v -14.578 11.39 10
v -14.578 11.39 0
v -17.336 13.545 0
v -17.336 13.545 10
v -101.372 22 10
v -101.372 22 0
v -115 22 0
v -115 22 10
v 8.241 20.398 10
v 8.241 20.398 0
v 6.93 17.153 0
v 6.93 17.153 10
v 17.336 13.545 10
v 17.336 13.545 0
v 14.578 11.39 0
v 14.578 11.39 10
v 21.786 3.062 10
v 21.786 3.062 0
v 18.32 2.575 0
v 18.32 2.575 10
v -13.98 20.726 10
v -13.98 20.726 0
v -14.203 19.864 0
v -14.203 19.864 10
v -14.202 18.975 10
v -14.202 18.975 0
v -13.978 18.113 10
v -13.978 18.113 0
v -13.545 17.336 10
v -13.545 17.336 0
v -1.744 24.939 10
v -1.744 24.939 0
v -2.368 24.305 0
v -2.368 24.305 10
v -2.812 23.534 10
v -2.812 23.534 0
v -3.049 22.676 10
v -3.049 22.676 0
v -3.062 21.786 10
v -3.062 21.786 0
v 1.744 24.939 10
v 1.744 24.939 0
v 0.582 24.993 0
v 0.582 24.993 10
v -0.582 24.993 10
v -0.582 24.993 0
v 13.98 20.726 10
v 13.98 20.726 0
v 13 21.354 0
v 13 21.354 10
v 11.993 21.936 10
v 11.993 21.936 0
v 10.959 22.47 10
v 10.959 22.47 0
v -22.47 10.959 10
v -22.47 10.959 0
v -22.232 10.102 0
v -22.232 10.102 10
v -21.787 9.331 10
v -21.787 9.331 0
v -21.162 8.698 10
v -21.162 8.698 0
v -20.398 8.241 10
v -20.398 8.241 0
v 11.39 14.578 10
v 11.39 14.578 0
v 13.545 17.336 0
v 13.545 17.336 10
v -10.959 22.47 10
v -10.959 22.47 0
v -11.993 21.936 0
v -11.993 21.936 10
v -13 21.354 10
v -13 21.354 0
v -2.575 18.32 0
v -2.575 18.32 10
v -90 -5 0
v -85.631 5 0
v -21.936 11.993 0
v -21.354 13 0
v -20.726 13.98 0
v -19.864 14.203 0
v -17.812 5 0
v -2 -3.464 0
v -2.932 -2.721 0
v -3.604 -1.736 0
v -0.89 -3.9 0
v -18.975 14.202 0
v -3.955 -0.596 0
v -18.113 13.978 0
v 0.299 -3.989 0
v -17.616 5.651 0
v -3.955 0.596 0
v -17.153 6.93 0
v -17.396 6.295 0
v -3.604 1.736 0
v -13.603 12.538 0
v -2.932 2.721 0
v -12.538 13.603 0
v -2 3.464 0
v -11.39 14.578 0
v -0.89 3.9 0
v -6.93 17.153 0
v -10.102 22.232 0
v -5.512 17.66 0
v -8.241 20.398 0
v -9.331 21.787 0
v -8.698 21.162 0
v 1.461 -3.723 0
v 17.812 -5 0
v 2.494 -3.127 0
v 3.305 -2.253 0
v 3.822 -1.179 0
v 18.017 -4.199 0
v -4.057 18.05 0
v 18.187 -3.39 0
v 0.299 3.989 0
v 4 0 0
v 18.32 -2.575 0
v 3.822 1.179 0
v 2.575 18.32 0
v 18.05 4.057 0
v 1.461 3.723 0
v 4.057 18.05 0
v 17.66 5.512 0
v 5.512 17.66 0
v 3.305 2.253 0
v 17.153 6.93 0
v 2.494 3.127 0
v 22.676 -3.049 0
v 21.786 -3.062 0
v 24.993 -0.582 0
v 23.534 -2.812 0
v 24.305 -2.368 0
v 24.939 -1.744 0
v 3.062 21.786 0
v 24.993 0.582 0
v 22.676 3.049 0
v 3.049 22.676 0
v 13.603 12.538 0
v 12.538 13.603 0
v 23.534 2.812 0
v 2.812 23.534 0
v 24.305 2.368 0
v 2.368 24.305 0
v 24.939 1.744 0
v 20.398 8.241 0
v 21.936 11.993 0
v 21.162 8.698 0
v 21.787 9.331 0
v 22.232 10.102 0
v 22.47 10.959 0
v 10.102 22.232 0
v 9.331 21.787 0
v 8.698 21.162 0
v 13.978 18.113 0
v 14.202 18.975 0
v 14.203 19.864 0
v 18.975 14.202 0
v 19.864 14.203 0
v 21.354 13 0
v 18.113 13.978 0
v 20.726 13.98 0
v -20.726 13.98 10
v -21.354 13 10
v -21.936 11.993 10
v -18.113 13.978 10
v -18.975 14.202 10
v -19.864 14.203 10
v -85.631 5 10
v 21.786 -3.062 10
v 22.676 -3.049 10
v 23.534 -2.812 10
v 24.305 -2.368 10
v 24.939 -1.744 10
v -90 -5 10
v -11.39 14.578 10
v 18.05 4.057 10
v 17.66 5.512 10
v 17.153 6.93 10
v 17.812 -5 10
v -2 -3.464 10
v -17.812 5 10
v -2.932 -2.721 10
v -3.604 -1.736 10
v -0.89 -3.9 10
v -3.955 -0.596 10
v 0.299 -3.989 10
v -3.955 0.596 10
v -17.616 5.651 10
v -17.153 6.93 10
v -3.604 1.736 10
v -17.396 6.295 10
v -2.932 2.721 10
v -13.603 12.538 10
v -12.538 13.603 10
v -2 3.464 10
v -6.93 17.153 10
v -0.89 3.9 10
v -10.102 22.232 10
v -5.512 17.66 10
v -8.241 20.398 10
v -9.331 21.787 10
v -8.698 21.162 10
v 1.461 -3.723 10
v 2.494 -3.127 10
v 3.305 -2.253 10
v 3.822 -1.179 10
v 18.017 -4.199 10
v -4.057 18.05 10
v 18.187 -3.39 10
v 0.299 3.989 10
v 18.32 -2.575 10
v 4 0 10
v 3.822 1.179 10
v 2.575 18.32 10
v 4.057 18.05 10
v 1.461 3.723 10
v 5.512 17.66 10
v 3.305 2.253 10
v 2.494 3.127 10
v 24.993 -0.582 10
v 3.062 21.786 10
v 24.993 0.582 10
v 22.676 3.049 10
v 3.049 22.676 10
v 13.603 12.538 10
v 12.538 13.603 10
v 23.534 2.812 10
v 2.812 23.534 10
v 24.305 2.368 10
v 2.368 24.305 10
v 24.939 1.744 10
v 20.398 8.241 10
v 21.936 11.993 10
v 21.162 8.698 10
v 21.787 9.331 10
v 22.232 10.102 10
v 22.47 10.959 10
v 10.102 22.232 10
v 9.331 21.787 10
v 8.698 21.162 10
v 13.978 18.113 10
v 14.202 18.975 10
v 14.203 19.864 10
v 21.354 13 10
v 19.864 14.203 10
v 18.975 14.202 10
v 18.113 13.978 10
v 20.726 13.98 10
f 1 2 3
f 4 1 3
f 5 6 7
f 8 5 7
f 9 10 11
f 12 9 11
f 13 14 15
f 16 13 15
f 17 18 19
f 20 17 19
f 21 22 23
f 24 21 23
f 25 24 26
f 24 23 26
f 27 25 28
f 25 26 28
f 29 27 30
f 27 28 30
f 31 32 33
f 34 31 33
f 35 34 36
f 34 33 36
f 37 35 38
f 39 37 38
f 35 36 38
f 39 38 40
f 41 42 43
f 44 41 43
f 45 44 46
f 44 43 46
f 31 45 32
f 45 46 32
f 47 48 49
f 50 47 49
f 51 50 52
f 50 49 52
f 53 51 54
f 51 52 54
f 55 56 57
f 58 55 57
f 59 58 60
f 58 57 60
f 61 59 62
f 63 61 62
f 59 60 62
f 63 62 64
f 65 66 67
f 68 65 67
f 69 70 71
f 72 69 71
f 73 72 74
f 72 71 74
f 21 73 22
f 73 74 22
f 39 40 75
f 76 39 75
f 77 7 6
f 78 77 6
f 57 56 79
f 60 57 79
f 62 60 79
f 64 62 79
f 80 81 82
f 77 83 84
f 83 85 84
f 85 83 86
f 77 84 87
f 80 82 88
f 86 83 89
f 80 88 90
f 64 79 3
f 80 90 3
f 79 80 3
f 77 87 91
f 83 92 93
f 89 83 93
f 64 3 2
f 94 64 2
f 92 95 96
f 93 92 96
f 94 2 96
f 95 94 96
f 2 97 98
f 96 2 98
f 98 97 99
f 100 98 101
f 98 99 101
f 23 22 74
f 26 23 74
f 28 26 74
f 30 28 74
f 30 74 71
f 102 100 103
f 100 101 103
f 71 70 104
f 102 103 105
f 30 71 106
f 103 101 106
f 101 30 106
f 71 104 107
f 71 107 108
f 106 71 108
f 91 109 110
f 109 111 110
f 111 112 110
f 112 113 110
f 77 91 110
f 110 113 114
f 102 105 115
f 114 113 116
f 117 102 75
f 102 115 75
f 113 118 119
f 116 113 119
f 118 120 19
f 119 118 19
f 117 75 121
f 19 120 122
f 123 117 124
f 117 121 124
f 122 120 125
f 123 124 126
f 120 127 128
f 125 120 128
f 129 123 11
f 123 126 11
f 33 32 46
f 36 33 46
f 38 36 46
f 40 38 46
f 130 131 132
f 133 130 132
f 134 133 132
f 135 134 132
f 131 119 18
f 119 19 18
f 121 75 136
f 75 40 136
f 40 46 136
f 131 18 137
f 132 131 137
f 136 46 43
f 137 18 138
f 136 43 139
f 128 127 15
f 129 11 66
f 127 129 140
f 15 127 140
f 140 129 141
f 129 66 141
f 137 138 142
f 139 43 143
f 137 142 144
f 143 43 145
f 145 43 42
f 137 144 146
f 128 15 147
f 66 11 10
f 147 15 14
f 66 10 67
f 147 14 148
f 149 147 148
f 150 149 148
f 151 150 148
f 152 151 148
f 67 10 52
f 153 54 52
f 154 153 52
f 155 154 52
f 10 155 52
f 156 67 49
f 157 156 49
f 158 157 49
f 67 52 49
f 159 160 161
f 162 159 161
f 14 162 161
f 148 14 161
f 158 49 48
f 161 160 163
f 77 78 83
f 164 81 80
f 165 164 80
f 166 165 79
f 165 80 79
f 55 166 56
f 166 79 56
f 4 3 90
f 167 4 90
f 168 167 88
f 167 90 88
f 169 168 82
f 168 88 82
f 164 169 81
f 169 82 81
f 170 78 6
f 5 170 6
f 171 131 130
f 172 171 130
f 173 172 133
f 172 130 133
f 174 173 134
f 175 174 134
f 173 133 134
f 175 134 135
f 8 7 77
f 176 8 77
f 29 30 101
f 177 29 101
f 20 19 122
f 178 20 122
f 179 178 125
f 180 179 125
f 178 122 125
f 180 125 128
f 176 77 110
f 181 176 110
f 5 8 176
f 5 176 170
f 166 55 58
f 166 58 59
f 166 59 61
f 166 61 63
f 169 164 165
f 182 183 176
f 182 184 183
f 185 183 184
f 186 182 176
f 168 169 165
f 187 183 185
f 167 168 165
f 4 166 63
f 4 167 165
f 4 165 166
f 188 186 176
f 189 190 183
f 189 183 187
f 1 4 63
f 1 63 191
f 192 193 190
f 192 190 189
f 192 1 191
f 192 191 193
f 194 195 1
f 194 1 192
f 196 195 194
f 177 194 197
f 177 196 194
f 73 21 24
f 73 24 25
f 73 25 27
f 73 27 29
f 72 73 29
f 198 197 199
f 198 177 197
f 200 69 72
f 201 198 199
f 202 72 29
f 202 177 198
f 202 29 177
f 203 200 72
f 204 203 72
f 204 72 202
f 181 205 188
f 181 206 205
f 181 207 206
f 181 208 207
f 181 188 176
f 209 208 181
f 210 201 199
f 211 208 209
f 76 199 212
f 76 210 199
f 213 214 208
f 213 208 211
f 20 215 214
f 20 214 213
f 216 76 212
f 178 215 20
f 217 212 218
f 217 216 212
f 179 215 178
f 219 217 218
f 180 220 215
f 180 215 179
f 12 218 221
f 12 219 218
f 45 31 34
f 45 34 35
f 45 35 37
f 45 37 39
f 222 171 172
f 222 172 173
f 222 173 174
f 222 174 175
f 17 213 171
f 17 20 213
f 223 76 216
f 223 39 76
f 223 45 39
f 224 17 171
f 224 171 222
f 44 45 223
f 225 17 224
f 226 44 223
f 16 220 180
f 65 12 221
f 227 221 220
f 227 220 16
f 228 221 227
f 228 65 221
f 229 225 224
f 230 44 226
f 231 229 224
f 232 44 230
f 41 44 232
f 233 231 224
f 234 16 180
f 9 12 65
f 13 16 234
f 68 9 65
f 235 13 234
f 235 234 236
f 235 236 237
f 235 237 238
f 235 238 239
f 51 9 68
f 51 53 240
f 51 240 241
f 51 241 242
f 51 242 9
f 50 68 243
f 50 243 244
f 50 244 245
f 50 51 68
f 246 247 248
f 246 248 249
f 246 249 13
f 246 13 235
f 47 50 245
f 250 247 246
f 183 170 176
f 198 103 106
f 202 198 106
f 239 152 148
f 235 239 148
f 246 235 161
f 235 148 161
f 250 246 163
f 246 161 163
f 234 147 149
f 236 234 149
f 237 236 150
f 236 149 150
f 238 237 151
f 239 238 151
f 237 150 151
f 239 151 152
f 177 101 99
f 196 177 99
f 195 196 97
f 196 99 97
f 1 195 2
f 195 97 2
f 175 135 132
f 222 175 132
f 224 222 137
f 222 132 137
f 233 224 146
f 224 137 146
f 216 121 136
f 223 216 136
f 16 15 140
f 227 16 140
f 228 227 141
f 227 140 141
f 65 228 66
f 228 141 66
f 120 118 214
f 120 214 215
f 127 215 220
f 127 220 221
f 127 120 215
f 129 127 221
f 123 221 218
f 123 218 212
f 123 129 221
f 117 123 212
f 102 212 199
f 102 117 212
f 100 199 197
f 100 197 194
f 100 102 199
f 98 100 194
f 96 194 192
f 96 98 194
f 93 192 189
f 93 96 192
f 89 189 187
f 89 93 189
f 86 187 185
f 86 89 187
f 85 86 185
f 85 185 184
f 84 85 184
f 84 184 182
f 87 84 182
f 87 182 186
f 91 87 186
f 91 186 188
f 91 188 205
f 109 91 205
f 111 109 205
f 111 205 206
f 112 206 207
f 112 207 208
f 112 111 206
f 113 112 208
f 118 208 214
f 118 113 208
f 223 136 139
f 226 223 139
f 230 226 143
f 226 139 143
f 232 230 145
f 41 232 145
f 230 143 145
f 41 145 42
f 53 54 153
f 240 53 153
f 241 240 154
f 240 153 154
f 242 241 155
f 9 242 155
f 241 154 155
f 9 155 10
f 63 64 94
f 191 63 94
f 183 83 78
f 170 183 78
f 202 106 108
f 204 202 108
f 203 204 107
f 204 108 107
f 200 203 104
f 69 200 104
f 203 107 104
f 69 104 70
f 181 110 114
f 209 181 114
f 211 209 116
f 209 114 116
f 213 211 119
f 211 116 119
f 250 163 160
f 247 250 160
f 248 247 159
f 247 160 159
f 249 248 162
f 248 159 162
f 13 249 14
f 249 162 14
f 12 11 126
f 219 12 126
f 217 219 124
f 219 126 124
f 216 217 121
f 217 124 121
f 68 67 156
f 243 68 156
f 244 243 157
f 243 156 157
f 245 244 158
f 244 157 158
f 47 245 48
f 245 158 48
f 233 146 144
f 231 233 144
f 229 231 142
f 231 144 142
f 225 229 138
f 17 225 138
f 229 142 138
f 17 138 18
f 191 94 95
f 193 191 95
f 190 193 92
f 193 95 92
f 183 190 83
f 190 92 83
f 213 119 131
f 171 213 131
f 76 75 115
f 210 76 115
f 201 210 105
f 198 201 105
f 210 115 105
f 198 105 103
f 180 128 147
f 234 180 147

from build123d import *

# Parameters (mm, degrees)
SKETCH1_R           = 4
BOSS_EXTRUDE2_DEPTH = 10


with BuildPart() as part:
    # Sketch1 → Boss-Extrude2 (new body)
    with BuildSketch(Plane.XY):
        with BuildLine():
            Line((-101.371578153, 22), (-115, 22))
            Line((-115, 22), (-90, -5))
            Line((-90, -5), (17.811513131, -5))
            ThreePointArc((17.811513131, -5), (18.106389525, -3.79587386), (18.319959272, -2.574702368))
            Line((18.319959272, -2.574702368), (21.785897512, -3.061808221))
            ThreePointArc((21.785897512, -3.061808221), (23.533640729, -2.812333445), (24.939101256, -1.743911844))
            ThreePointArc((24.939101256, -1.743911844), (25, 0), (24.939101256, 1.743911844))
            ThreePointArc((24.939101256, 1.743911844), (23.533640729, 2.812333445), (21.785897512, 3.061808221))
            Line((21.785897512, 3.061808221), (18.319959272, 2.574702368))
            ThreePointArc((18.319959272, 2.574702368), (17.869627786, 4.788152334), (17.152901309, 6.930221978))
            Line((17.152901309, 6.930221978), (20.3980448, 8.241345055))
            ThreePointArc((20.3980448, 8.241345055), (21.786897437, 9.331268157), (22.469851157, 10.95927867))
            ThreePointArc((22.469851157, 10.95927867), (21.650635095, 12.5), (20.725939314, 13.979822587))
            ThreePointArc((20.725939314, 13.979822587), (18.974563992, 14.202372572), (17.336236579, 13.544552457))
            Line((17.336236579, 13.544552457), (14.578198942, 11.389737294))
            ThreePointArc((14.578198942, 11.389737294), (13.081475452, 13.081475452), (11.389737294, 14.578198942))
            Line((11.389737294, 14.578198942), (13.544552457, 17.336236579))
            ThreePointArc((13.544552457, 17.336236579), (14.202372572, 18.974563992), (13.979822587, 20.725939314))
            ThreePointArc((13.979822587, 20.725939314), (12.5, 21.650635095), (10.95927867, 22.469851157))
            ThreePointArc((10.95927867, 22.469851157), (9.331268157, 21.786897437), (8.241345055, 20.3980448))
            Line((8.241345055, 20.3980448), (6.930221978, 17.152901309))
            ThreePointArc((6.930221978, 17.152901309), (4.788152334, 17.869627786), (2.574702368, 18.319959272))
            Line((2.574702368, 18.319959272), (3.061808221, 21.785897512))
            ThreePointArc((3.061808221, 21.785897512), (2.812333445, 23.533640729), (1.743911844, 24.939101256))
            ThreePointArc((1.743911844, 24.939101256), (0, 25), (-1.743911844, 24.939101256))
            ThreePointArc((-1.743911844, 24.939101256), (-2.812333445, 23.533640729), (-3.061808221, 21.785897512))
            Line((-3.061808221, 21.785897512), (-2.574702368, 18.319959272))
            ThreePointArc((-2.574702368, 18.319959272), (-4.788152334, 17.869627786), (-6.930221978, 17.152901309))
            Line((-6.930221978, 17.152901309), (-8.241345055, 20.3980448))
            ThreePointArc((-8.241345055, 20.3980448), (-9.331268157, 21.786897437), (-10.95927867, 22.469851157))
            ThreePointArc((-10.95927867, 22.469851157), (-12.5, 21.650635095), (-13.979822587, 20.725939314))
            ThreePointArc((-13.979822587, 20.725939314), (-14.202372572, 18.974563992), (-13.544552457, 17.336236579))
            Line((-13.544552457, 17.336236579), (-11.389737294, 14.578198942))
            ThreePointArc((-11.389737294, 14.578198942), (-13.081475452, 13.081475452), (-14.578198942, 11.389737294))
            Line((-14.578198942, 11.389737294), (-17.336236579, 13.544552457))
            ThreePointArc((-17.336236579, 13.544552457), (-18.974563992, 14.202372572), (-20.725939314, 13.979822587))
            ThreePointArc((-20.725939314, 13.979822587), (-21.650635095, 12.5), (-22.469851157, 10.95927867))
            ThreePointArc((-22.469851157, 10.95927867), (-21.786897437, 9.331268157), (-20.3980448, 8.241345055))
            Line((-20.3980448, 8.241345055), (-17.152901309, 6.930221978))
            ThreePointArc((-17.152901309, 6.930221978), (-17.508826588, 5.974193795), (-17.811513131, 5))
            Line((-17.811513131, 5), (-85.630837413, 5))
            Line((-85.630837413, 5), (-101.371578153, 22))
        make_face()
        Circle(SKETCH1_R, mode=Mode.SUBTRACT)
    extrude(amount=BOSS_EXTRUDE2_DEPTH)


solid = part.part
